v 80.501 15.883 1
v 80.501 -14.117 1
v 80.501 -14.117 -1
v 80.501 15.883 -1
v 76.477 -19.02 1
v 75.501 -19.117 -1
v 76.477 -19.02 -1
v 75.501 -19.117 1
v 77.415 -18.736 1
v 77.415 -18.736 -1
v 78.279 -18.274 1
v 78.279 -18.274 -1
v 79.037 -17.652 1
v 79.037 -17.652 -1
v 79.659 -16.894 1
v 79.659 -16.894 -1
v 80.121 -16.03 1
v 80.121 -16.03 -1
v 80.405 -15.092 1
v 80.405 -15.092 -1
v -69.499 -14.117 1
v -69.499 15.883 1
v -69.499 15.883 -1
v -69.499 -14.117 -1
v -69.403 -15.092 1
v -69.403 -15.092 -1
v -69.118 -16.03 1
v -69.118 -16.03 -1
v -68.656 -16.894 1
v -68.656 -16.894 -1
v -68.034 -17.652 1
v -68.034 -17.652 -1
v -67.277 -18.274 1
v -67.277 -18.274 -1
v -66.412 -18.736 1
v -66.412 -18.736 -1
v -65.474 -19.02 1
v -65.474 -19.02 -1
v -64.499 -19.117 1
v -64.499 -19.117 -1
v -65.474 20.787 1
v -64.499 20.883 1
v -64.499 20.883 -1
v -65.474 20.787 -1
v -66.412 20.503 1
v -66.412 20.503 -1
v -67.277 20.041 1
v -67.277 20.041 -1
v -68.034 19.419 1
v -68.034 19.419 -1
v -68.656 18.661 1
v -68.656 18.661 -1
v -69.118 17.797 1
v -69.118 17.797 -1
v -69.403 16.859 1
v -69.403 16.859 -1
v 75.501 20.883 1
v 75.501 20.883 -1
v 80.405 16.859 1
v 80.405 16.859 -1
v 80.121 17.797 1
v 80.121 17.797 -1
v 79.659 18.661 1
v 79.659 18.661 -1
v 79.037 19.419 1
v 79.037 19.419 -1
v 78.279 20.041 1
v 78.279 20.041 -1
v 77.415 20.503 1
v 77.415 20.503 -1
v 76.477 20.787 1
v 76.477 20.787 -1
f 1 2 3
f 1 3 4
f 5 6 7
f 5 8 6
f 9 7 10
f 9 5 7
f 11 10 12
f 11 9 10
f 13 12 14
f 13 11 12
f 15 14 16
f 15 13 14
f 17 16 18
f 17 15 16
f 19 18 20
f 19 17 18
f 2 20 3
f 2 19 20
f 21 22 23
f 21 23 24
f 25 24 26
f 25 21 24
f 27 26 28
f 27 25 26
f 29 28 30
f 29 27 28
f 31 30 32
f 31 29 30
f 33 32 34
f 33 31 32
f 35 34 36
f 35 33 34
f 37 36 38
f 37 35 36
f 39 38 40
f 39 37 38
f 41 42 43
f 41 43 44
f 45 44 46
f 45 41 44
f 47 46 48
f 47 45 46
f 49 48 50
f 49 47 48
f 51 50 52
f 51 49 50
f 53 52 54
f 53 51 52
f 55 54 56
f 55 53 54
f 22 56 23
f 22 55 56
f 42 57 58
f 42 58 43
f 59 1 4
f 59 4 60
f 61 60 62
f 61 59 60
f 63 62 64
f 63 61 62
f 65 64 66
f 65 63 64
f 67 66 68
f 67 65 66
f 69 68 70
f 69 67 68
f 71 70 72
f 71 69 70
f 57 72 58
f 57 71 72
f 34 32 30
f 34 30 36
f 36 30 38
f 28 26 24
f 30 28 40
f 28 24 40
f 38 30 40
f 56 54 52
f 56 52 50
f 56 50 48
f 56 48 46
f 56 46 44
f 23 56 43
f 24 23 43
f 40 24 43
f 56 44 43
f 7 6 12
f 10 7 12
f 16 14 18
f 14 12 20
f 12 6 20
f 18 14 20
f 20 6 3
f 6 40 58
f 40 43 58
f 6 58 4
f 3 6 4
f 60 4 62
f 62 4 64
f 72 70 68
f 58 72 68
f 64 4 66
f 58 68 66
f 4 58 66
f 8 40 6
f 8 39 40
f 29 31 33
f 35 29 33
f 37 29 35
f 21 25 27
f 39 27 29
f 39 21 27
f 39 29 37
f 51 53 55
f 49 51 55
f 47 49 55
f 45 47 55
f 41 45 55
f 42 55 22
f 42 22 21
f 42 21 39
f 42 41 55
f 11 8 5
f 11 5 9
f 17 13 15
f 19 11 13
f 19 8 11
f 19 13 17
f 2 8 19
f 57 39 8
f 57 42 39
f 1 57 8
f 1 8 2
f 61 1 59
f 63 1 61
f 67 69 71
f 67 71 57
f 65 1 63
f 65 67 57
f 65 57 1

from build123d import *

# Parameters (mm, degrees)
BOSS_EXTRUDE1_DEPTH = 1


with BuildPart() as part:
    # Sketch1 → Boss-Extrude1 (new, symmetric)
    with BuildSketch(Plane.XY):
        with BuildLine():
            Line((-4.498723713, -19.116500582), (15.501276287, -19.116500582))
            Line((15.501276287, -19.116500582), (75.501276287, -19.116500582))
            ThreePointArc((75.501276287, -19.116500582), (79.036810193, -17.652034487), (80.501276287, -14.116500582))
            Line((80.501276287, -14.116500582), (80.501276287, 15.883499418))
            ThreePointArc((80.501276287, 15.883499418), (79.036810193, 19.419033324), (75.501276287, 20.883499418))
            Line((75.501276287, 20.883499418), (-64.498723713, 20.883499418))
            ThreePointArc((-64.498723713, 20.883499418), (-68.034257619, 19.419033324), (-69.498723713, 15.883499418))
            Line((-69.498723713, 15.883499418), (-69.498723713, -14.116500582))
            ThreePointArc((-69.498723713, -14.116500582), (-68.034257619, -17.652034487), (-64.498723713, -19.116500582))
            Line((-64.498723713, -19.116500582), (-4.498723713, -19.116500582))
        make_face()
    extrude(amount=BOSS_EXTRUDE1_DEPTH, both=True)


solid = part.part
